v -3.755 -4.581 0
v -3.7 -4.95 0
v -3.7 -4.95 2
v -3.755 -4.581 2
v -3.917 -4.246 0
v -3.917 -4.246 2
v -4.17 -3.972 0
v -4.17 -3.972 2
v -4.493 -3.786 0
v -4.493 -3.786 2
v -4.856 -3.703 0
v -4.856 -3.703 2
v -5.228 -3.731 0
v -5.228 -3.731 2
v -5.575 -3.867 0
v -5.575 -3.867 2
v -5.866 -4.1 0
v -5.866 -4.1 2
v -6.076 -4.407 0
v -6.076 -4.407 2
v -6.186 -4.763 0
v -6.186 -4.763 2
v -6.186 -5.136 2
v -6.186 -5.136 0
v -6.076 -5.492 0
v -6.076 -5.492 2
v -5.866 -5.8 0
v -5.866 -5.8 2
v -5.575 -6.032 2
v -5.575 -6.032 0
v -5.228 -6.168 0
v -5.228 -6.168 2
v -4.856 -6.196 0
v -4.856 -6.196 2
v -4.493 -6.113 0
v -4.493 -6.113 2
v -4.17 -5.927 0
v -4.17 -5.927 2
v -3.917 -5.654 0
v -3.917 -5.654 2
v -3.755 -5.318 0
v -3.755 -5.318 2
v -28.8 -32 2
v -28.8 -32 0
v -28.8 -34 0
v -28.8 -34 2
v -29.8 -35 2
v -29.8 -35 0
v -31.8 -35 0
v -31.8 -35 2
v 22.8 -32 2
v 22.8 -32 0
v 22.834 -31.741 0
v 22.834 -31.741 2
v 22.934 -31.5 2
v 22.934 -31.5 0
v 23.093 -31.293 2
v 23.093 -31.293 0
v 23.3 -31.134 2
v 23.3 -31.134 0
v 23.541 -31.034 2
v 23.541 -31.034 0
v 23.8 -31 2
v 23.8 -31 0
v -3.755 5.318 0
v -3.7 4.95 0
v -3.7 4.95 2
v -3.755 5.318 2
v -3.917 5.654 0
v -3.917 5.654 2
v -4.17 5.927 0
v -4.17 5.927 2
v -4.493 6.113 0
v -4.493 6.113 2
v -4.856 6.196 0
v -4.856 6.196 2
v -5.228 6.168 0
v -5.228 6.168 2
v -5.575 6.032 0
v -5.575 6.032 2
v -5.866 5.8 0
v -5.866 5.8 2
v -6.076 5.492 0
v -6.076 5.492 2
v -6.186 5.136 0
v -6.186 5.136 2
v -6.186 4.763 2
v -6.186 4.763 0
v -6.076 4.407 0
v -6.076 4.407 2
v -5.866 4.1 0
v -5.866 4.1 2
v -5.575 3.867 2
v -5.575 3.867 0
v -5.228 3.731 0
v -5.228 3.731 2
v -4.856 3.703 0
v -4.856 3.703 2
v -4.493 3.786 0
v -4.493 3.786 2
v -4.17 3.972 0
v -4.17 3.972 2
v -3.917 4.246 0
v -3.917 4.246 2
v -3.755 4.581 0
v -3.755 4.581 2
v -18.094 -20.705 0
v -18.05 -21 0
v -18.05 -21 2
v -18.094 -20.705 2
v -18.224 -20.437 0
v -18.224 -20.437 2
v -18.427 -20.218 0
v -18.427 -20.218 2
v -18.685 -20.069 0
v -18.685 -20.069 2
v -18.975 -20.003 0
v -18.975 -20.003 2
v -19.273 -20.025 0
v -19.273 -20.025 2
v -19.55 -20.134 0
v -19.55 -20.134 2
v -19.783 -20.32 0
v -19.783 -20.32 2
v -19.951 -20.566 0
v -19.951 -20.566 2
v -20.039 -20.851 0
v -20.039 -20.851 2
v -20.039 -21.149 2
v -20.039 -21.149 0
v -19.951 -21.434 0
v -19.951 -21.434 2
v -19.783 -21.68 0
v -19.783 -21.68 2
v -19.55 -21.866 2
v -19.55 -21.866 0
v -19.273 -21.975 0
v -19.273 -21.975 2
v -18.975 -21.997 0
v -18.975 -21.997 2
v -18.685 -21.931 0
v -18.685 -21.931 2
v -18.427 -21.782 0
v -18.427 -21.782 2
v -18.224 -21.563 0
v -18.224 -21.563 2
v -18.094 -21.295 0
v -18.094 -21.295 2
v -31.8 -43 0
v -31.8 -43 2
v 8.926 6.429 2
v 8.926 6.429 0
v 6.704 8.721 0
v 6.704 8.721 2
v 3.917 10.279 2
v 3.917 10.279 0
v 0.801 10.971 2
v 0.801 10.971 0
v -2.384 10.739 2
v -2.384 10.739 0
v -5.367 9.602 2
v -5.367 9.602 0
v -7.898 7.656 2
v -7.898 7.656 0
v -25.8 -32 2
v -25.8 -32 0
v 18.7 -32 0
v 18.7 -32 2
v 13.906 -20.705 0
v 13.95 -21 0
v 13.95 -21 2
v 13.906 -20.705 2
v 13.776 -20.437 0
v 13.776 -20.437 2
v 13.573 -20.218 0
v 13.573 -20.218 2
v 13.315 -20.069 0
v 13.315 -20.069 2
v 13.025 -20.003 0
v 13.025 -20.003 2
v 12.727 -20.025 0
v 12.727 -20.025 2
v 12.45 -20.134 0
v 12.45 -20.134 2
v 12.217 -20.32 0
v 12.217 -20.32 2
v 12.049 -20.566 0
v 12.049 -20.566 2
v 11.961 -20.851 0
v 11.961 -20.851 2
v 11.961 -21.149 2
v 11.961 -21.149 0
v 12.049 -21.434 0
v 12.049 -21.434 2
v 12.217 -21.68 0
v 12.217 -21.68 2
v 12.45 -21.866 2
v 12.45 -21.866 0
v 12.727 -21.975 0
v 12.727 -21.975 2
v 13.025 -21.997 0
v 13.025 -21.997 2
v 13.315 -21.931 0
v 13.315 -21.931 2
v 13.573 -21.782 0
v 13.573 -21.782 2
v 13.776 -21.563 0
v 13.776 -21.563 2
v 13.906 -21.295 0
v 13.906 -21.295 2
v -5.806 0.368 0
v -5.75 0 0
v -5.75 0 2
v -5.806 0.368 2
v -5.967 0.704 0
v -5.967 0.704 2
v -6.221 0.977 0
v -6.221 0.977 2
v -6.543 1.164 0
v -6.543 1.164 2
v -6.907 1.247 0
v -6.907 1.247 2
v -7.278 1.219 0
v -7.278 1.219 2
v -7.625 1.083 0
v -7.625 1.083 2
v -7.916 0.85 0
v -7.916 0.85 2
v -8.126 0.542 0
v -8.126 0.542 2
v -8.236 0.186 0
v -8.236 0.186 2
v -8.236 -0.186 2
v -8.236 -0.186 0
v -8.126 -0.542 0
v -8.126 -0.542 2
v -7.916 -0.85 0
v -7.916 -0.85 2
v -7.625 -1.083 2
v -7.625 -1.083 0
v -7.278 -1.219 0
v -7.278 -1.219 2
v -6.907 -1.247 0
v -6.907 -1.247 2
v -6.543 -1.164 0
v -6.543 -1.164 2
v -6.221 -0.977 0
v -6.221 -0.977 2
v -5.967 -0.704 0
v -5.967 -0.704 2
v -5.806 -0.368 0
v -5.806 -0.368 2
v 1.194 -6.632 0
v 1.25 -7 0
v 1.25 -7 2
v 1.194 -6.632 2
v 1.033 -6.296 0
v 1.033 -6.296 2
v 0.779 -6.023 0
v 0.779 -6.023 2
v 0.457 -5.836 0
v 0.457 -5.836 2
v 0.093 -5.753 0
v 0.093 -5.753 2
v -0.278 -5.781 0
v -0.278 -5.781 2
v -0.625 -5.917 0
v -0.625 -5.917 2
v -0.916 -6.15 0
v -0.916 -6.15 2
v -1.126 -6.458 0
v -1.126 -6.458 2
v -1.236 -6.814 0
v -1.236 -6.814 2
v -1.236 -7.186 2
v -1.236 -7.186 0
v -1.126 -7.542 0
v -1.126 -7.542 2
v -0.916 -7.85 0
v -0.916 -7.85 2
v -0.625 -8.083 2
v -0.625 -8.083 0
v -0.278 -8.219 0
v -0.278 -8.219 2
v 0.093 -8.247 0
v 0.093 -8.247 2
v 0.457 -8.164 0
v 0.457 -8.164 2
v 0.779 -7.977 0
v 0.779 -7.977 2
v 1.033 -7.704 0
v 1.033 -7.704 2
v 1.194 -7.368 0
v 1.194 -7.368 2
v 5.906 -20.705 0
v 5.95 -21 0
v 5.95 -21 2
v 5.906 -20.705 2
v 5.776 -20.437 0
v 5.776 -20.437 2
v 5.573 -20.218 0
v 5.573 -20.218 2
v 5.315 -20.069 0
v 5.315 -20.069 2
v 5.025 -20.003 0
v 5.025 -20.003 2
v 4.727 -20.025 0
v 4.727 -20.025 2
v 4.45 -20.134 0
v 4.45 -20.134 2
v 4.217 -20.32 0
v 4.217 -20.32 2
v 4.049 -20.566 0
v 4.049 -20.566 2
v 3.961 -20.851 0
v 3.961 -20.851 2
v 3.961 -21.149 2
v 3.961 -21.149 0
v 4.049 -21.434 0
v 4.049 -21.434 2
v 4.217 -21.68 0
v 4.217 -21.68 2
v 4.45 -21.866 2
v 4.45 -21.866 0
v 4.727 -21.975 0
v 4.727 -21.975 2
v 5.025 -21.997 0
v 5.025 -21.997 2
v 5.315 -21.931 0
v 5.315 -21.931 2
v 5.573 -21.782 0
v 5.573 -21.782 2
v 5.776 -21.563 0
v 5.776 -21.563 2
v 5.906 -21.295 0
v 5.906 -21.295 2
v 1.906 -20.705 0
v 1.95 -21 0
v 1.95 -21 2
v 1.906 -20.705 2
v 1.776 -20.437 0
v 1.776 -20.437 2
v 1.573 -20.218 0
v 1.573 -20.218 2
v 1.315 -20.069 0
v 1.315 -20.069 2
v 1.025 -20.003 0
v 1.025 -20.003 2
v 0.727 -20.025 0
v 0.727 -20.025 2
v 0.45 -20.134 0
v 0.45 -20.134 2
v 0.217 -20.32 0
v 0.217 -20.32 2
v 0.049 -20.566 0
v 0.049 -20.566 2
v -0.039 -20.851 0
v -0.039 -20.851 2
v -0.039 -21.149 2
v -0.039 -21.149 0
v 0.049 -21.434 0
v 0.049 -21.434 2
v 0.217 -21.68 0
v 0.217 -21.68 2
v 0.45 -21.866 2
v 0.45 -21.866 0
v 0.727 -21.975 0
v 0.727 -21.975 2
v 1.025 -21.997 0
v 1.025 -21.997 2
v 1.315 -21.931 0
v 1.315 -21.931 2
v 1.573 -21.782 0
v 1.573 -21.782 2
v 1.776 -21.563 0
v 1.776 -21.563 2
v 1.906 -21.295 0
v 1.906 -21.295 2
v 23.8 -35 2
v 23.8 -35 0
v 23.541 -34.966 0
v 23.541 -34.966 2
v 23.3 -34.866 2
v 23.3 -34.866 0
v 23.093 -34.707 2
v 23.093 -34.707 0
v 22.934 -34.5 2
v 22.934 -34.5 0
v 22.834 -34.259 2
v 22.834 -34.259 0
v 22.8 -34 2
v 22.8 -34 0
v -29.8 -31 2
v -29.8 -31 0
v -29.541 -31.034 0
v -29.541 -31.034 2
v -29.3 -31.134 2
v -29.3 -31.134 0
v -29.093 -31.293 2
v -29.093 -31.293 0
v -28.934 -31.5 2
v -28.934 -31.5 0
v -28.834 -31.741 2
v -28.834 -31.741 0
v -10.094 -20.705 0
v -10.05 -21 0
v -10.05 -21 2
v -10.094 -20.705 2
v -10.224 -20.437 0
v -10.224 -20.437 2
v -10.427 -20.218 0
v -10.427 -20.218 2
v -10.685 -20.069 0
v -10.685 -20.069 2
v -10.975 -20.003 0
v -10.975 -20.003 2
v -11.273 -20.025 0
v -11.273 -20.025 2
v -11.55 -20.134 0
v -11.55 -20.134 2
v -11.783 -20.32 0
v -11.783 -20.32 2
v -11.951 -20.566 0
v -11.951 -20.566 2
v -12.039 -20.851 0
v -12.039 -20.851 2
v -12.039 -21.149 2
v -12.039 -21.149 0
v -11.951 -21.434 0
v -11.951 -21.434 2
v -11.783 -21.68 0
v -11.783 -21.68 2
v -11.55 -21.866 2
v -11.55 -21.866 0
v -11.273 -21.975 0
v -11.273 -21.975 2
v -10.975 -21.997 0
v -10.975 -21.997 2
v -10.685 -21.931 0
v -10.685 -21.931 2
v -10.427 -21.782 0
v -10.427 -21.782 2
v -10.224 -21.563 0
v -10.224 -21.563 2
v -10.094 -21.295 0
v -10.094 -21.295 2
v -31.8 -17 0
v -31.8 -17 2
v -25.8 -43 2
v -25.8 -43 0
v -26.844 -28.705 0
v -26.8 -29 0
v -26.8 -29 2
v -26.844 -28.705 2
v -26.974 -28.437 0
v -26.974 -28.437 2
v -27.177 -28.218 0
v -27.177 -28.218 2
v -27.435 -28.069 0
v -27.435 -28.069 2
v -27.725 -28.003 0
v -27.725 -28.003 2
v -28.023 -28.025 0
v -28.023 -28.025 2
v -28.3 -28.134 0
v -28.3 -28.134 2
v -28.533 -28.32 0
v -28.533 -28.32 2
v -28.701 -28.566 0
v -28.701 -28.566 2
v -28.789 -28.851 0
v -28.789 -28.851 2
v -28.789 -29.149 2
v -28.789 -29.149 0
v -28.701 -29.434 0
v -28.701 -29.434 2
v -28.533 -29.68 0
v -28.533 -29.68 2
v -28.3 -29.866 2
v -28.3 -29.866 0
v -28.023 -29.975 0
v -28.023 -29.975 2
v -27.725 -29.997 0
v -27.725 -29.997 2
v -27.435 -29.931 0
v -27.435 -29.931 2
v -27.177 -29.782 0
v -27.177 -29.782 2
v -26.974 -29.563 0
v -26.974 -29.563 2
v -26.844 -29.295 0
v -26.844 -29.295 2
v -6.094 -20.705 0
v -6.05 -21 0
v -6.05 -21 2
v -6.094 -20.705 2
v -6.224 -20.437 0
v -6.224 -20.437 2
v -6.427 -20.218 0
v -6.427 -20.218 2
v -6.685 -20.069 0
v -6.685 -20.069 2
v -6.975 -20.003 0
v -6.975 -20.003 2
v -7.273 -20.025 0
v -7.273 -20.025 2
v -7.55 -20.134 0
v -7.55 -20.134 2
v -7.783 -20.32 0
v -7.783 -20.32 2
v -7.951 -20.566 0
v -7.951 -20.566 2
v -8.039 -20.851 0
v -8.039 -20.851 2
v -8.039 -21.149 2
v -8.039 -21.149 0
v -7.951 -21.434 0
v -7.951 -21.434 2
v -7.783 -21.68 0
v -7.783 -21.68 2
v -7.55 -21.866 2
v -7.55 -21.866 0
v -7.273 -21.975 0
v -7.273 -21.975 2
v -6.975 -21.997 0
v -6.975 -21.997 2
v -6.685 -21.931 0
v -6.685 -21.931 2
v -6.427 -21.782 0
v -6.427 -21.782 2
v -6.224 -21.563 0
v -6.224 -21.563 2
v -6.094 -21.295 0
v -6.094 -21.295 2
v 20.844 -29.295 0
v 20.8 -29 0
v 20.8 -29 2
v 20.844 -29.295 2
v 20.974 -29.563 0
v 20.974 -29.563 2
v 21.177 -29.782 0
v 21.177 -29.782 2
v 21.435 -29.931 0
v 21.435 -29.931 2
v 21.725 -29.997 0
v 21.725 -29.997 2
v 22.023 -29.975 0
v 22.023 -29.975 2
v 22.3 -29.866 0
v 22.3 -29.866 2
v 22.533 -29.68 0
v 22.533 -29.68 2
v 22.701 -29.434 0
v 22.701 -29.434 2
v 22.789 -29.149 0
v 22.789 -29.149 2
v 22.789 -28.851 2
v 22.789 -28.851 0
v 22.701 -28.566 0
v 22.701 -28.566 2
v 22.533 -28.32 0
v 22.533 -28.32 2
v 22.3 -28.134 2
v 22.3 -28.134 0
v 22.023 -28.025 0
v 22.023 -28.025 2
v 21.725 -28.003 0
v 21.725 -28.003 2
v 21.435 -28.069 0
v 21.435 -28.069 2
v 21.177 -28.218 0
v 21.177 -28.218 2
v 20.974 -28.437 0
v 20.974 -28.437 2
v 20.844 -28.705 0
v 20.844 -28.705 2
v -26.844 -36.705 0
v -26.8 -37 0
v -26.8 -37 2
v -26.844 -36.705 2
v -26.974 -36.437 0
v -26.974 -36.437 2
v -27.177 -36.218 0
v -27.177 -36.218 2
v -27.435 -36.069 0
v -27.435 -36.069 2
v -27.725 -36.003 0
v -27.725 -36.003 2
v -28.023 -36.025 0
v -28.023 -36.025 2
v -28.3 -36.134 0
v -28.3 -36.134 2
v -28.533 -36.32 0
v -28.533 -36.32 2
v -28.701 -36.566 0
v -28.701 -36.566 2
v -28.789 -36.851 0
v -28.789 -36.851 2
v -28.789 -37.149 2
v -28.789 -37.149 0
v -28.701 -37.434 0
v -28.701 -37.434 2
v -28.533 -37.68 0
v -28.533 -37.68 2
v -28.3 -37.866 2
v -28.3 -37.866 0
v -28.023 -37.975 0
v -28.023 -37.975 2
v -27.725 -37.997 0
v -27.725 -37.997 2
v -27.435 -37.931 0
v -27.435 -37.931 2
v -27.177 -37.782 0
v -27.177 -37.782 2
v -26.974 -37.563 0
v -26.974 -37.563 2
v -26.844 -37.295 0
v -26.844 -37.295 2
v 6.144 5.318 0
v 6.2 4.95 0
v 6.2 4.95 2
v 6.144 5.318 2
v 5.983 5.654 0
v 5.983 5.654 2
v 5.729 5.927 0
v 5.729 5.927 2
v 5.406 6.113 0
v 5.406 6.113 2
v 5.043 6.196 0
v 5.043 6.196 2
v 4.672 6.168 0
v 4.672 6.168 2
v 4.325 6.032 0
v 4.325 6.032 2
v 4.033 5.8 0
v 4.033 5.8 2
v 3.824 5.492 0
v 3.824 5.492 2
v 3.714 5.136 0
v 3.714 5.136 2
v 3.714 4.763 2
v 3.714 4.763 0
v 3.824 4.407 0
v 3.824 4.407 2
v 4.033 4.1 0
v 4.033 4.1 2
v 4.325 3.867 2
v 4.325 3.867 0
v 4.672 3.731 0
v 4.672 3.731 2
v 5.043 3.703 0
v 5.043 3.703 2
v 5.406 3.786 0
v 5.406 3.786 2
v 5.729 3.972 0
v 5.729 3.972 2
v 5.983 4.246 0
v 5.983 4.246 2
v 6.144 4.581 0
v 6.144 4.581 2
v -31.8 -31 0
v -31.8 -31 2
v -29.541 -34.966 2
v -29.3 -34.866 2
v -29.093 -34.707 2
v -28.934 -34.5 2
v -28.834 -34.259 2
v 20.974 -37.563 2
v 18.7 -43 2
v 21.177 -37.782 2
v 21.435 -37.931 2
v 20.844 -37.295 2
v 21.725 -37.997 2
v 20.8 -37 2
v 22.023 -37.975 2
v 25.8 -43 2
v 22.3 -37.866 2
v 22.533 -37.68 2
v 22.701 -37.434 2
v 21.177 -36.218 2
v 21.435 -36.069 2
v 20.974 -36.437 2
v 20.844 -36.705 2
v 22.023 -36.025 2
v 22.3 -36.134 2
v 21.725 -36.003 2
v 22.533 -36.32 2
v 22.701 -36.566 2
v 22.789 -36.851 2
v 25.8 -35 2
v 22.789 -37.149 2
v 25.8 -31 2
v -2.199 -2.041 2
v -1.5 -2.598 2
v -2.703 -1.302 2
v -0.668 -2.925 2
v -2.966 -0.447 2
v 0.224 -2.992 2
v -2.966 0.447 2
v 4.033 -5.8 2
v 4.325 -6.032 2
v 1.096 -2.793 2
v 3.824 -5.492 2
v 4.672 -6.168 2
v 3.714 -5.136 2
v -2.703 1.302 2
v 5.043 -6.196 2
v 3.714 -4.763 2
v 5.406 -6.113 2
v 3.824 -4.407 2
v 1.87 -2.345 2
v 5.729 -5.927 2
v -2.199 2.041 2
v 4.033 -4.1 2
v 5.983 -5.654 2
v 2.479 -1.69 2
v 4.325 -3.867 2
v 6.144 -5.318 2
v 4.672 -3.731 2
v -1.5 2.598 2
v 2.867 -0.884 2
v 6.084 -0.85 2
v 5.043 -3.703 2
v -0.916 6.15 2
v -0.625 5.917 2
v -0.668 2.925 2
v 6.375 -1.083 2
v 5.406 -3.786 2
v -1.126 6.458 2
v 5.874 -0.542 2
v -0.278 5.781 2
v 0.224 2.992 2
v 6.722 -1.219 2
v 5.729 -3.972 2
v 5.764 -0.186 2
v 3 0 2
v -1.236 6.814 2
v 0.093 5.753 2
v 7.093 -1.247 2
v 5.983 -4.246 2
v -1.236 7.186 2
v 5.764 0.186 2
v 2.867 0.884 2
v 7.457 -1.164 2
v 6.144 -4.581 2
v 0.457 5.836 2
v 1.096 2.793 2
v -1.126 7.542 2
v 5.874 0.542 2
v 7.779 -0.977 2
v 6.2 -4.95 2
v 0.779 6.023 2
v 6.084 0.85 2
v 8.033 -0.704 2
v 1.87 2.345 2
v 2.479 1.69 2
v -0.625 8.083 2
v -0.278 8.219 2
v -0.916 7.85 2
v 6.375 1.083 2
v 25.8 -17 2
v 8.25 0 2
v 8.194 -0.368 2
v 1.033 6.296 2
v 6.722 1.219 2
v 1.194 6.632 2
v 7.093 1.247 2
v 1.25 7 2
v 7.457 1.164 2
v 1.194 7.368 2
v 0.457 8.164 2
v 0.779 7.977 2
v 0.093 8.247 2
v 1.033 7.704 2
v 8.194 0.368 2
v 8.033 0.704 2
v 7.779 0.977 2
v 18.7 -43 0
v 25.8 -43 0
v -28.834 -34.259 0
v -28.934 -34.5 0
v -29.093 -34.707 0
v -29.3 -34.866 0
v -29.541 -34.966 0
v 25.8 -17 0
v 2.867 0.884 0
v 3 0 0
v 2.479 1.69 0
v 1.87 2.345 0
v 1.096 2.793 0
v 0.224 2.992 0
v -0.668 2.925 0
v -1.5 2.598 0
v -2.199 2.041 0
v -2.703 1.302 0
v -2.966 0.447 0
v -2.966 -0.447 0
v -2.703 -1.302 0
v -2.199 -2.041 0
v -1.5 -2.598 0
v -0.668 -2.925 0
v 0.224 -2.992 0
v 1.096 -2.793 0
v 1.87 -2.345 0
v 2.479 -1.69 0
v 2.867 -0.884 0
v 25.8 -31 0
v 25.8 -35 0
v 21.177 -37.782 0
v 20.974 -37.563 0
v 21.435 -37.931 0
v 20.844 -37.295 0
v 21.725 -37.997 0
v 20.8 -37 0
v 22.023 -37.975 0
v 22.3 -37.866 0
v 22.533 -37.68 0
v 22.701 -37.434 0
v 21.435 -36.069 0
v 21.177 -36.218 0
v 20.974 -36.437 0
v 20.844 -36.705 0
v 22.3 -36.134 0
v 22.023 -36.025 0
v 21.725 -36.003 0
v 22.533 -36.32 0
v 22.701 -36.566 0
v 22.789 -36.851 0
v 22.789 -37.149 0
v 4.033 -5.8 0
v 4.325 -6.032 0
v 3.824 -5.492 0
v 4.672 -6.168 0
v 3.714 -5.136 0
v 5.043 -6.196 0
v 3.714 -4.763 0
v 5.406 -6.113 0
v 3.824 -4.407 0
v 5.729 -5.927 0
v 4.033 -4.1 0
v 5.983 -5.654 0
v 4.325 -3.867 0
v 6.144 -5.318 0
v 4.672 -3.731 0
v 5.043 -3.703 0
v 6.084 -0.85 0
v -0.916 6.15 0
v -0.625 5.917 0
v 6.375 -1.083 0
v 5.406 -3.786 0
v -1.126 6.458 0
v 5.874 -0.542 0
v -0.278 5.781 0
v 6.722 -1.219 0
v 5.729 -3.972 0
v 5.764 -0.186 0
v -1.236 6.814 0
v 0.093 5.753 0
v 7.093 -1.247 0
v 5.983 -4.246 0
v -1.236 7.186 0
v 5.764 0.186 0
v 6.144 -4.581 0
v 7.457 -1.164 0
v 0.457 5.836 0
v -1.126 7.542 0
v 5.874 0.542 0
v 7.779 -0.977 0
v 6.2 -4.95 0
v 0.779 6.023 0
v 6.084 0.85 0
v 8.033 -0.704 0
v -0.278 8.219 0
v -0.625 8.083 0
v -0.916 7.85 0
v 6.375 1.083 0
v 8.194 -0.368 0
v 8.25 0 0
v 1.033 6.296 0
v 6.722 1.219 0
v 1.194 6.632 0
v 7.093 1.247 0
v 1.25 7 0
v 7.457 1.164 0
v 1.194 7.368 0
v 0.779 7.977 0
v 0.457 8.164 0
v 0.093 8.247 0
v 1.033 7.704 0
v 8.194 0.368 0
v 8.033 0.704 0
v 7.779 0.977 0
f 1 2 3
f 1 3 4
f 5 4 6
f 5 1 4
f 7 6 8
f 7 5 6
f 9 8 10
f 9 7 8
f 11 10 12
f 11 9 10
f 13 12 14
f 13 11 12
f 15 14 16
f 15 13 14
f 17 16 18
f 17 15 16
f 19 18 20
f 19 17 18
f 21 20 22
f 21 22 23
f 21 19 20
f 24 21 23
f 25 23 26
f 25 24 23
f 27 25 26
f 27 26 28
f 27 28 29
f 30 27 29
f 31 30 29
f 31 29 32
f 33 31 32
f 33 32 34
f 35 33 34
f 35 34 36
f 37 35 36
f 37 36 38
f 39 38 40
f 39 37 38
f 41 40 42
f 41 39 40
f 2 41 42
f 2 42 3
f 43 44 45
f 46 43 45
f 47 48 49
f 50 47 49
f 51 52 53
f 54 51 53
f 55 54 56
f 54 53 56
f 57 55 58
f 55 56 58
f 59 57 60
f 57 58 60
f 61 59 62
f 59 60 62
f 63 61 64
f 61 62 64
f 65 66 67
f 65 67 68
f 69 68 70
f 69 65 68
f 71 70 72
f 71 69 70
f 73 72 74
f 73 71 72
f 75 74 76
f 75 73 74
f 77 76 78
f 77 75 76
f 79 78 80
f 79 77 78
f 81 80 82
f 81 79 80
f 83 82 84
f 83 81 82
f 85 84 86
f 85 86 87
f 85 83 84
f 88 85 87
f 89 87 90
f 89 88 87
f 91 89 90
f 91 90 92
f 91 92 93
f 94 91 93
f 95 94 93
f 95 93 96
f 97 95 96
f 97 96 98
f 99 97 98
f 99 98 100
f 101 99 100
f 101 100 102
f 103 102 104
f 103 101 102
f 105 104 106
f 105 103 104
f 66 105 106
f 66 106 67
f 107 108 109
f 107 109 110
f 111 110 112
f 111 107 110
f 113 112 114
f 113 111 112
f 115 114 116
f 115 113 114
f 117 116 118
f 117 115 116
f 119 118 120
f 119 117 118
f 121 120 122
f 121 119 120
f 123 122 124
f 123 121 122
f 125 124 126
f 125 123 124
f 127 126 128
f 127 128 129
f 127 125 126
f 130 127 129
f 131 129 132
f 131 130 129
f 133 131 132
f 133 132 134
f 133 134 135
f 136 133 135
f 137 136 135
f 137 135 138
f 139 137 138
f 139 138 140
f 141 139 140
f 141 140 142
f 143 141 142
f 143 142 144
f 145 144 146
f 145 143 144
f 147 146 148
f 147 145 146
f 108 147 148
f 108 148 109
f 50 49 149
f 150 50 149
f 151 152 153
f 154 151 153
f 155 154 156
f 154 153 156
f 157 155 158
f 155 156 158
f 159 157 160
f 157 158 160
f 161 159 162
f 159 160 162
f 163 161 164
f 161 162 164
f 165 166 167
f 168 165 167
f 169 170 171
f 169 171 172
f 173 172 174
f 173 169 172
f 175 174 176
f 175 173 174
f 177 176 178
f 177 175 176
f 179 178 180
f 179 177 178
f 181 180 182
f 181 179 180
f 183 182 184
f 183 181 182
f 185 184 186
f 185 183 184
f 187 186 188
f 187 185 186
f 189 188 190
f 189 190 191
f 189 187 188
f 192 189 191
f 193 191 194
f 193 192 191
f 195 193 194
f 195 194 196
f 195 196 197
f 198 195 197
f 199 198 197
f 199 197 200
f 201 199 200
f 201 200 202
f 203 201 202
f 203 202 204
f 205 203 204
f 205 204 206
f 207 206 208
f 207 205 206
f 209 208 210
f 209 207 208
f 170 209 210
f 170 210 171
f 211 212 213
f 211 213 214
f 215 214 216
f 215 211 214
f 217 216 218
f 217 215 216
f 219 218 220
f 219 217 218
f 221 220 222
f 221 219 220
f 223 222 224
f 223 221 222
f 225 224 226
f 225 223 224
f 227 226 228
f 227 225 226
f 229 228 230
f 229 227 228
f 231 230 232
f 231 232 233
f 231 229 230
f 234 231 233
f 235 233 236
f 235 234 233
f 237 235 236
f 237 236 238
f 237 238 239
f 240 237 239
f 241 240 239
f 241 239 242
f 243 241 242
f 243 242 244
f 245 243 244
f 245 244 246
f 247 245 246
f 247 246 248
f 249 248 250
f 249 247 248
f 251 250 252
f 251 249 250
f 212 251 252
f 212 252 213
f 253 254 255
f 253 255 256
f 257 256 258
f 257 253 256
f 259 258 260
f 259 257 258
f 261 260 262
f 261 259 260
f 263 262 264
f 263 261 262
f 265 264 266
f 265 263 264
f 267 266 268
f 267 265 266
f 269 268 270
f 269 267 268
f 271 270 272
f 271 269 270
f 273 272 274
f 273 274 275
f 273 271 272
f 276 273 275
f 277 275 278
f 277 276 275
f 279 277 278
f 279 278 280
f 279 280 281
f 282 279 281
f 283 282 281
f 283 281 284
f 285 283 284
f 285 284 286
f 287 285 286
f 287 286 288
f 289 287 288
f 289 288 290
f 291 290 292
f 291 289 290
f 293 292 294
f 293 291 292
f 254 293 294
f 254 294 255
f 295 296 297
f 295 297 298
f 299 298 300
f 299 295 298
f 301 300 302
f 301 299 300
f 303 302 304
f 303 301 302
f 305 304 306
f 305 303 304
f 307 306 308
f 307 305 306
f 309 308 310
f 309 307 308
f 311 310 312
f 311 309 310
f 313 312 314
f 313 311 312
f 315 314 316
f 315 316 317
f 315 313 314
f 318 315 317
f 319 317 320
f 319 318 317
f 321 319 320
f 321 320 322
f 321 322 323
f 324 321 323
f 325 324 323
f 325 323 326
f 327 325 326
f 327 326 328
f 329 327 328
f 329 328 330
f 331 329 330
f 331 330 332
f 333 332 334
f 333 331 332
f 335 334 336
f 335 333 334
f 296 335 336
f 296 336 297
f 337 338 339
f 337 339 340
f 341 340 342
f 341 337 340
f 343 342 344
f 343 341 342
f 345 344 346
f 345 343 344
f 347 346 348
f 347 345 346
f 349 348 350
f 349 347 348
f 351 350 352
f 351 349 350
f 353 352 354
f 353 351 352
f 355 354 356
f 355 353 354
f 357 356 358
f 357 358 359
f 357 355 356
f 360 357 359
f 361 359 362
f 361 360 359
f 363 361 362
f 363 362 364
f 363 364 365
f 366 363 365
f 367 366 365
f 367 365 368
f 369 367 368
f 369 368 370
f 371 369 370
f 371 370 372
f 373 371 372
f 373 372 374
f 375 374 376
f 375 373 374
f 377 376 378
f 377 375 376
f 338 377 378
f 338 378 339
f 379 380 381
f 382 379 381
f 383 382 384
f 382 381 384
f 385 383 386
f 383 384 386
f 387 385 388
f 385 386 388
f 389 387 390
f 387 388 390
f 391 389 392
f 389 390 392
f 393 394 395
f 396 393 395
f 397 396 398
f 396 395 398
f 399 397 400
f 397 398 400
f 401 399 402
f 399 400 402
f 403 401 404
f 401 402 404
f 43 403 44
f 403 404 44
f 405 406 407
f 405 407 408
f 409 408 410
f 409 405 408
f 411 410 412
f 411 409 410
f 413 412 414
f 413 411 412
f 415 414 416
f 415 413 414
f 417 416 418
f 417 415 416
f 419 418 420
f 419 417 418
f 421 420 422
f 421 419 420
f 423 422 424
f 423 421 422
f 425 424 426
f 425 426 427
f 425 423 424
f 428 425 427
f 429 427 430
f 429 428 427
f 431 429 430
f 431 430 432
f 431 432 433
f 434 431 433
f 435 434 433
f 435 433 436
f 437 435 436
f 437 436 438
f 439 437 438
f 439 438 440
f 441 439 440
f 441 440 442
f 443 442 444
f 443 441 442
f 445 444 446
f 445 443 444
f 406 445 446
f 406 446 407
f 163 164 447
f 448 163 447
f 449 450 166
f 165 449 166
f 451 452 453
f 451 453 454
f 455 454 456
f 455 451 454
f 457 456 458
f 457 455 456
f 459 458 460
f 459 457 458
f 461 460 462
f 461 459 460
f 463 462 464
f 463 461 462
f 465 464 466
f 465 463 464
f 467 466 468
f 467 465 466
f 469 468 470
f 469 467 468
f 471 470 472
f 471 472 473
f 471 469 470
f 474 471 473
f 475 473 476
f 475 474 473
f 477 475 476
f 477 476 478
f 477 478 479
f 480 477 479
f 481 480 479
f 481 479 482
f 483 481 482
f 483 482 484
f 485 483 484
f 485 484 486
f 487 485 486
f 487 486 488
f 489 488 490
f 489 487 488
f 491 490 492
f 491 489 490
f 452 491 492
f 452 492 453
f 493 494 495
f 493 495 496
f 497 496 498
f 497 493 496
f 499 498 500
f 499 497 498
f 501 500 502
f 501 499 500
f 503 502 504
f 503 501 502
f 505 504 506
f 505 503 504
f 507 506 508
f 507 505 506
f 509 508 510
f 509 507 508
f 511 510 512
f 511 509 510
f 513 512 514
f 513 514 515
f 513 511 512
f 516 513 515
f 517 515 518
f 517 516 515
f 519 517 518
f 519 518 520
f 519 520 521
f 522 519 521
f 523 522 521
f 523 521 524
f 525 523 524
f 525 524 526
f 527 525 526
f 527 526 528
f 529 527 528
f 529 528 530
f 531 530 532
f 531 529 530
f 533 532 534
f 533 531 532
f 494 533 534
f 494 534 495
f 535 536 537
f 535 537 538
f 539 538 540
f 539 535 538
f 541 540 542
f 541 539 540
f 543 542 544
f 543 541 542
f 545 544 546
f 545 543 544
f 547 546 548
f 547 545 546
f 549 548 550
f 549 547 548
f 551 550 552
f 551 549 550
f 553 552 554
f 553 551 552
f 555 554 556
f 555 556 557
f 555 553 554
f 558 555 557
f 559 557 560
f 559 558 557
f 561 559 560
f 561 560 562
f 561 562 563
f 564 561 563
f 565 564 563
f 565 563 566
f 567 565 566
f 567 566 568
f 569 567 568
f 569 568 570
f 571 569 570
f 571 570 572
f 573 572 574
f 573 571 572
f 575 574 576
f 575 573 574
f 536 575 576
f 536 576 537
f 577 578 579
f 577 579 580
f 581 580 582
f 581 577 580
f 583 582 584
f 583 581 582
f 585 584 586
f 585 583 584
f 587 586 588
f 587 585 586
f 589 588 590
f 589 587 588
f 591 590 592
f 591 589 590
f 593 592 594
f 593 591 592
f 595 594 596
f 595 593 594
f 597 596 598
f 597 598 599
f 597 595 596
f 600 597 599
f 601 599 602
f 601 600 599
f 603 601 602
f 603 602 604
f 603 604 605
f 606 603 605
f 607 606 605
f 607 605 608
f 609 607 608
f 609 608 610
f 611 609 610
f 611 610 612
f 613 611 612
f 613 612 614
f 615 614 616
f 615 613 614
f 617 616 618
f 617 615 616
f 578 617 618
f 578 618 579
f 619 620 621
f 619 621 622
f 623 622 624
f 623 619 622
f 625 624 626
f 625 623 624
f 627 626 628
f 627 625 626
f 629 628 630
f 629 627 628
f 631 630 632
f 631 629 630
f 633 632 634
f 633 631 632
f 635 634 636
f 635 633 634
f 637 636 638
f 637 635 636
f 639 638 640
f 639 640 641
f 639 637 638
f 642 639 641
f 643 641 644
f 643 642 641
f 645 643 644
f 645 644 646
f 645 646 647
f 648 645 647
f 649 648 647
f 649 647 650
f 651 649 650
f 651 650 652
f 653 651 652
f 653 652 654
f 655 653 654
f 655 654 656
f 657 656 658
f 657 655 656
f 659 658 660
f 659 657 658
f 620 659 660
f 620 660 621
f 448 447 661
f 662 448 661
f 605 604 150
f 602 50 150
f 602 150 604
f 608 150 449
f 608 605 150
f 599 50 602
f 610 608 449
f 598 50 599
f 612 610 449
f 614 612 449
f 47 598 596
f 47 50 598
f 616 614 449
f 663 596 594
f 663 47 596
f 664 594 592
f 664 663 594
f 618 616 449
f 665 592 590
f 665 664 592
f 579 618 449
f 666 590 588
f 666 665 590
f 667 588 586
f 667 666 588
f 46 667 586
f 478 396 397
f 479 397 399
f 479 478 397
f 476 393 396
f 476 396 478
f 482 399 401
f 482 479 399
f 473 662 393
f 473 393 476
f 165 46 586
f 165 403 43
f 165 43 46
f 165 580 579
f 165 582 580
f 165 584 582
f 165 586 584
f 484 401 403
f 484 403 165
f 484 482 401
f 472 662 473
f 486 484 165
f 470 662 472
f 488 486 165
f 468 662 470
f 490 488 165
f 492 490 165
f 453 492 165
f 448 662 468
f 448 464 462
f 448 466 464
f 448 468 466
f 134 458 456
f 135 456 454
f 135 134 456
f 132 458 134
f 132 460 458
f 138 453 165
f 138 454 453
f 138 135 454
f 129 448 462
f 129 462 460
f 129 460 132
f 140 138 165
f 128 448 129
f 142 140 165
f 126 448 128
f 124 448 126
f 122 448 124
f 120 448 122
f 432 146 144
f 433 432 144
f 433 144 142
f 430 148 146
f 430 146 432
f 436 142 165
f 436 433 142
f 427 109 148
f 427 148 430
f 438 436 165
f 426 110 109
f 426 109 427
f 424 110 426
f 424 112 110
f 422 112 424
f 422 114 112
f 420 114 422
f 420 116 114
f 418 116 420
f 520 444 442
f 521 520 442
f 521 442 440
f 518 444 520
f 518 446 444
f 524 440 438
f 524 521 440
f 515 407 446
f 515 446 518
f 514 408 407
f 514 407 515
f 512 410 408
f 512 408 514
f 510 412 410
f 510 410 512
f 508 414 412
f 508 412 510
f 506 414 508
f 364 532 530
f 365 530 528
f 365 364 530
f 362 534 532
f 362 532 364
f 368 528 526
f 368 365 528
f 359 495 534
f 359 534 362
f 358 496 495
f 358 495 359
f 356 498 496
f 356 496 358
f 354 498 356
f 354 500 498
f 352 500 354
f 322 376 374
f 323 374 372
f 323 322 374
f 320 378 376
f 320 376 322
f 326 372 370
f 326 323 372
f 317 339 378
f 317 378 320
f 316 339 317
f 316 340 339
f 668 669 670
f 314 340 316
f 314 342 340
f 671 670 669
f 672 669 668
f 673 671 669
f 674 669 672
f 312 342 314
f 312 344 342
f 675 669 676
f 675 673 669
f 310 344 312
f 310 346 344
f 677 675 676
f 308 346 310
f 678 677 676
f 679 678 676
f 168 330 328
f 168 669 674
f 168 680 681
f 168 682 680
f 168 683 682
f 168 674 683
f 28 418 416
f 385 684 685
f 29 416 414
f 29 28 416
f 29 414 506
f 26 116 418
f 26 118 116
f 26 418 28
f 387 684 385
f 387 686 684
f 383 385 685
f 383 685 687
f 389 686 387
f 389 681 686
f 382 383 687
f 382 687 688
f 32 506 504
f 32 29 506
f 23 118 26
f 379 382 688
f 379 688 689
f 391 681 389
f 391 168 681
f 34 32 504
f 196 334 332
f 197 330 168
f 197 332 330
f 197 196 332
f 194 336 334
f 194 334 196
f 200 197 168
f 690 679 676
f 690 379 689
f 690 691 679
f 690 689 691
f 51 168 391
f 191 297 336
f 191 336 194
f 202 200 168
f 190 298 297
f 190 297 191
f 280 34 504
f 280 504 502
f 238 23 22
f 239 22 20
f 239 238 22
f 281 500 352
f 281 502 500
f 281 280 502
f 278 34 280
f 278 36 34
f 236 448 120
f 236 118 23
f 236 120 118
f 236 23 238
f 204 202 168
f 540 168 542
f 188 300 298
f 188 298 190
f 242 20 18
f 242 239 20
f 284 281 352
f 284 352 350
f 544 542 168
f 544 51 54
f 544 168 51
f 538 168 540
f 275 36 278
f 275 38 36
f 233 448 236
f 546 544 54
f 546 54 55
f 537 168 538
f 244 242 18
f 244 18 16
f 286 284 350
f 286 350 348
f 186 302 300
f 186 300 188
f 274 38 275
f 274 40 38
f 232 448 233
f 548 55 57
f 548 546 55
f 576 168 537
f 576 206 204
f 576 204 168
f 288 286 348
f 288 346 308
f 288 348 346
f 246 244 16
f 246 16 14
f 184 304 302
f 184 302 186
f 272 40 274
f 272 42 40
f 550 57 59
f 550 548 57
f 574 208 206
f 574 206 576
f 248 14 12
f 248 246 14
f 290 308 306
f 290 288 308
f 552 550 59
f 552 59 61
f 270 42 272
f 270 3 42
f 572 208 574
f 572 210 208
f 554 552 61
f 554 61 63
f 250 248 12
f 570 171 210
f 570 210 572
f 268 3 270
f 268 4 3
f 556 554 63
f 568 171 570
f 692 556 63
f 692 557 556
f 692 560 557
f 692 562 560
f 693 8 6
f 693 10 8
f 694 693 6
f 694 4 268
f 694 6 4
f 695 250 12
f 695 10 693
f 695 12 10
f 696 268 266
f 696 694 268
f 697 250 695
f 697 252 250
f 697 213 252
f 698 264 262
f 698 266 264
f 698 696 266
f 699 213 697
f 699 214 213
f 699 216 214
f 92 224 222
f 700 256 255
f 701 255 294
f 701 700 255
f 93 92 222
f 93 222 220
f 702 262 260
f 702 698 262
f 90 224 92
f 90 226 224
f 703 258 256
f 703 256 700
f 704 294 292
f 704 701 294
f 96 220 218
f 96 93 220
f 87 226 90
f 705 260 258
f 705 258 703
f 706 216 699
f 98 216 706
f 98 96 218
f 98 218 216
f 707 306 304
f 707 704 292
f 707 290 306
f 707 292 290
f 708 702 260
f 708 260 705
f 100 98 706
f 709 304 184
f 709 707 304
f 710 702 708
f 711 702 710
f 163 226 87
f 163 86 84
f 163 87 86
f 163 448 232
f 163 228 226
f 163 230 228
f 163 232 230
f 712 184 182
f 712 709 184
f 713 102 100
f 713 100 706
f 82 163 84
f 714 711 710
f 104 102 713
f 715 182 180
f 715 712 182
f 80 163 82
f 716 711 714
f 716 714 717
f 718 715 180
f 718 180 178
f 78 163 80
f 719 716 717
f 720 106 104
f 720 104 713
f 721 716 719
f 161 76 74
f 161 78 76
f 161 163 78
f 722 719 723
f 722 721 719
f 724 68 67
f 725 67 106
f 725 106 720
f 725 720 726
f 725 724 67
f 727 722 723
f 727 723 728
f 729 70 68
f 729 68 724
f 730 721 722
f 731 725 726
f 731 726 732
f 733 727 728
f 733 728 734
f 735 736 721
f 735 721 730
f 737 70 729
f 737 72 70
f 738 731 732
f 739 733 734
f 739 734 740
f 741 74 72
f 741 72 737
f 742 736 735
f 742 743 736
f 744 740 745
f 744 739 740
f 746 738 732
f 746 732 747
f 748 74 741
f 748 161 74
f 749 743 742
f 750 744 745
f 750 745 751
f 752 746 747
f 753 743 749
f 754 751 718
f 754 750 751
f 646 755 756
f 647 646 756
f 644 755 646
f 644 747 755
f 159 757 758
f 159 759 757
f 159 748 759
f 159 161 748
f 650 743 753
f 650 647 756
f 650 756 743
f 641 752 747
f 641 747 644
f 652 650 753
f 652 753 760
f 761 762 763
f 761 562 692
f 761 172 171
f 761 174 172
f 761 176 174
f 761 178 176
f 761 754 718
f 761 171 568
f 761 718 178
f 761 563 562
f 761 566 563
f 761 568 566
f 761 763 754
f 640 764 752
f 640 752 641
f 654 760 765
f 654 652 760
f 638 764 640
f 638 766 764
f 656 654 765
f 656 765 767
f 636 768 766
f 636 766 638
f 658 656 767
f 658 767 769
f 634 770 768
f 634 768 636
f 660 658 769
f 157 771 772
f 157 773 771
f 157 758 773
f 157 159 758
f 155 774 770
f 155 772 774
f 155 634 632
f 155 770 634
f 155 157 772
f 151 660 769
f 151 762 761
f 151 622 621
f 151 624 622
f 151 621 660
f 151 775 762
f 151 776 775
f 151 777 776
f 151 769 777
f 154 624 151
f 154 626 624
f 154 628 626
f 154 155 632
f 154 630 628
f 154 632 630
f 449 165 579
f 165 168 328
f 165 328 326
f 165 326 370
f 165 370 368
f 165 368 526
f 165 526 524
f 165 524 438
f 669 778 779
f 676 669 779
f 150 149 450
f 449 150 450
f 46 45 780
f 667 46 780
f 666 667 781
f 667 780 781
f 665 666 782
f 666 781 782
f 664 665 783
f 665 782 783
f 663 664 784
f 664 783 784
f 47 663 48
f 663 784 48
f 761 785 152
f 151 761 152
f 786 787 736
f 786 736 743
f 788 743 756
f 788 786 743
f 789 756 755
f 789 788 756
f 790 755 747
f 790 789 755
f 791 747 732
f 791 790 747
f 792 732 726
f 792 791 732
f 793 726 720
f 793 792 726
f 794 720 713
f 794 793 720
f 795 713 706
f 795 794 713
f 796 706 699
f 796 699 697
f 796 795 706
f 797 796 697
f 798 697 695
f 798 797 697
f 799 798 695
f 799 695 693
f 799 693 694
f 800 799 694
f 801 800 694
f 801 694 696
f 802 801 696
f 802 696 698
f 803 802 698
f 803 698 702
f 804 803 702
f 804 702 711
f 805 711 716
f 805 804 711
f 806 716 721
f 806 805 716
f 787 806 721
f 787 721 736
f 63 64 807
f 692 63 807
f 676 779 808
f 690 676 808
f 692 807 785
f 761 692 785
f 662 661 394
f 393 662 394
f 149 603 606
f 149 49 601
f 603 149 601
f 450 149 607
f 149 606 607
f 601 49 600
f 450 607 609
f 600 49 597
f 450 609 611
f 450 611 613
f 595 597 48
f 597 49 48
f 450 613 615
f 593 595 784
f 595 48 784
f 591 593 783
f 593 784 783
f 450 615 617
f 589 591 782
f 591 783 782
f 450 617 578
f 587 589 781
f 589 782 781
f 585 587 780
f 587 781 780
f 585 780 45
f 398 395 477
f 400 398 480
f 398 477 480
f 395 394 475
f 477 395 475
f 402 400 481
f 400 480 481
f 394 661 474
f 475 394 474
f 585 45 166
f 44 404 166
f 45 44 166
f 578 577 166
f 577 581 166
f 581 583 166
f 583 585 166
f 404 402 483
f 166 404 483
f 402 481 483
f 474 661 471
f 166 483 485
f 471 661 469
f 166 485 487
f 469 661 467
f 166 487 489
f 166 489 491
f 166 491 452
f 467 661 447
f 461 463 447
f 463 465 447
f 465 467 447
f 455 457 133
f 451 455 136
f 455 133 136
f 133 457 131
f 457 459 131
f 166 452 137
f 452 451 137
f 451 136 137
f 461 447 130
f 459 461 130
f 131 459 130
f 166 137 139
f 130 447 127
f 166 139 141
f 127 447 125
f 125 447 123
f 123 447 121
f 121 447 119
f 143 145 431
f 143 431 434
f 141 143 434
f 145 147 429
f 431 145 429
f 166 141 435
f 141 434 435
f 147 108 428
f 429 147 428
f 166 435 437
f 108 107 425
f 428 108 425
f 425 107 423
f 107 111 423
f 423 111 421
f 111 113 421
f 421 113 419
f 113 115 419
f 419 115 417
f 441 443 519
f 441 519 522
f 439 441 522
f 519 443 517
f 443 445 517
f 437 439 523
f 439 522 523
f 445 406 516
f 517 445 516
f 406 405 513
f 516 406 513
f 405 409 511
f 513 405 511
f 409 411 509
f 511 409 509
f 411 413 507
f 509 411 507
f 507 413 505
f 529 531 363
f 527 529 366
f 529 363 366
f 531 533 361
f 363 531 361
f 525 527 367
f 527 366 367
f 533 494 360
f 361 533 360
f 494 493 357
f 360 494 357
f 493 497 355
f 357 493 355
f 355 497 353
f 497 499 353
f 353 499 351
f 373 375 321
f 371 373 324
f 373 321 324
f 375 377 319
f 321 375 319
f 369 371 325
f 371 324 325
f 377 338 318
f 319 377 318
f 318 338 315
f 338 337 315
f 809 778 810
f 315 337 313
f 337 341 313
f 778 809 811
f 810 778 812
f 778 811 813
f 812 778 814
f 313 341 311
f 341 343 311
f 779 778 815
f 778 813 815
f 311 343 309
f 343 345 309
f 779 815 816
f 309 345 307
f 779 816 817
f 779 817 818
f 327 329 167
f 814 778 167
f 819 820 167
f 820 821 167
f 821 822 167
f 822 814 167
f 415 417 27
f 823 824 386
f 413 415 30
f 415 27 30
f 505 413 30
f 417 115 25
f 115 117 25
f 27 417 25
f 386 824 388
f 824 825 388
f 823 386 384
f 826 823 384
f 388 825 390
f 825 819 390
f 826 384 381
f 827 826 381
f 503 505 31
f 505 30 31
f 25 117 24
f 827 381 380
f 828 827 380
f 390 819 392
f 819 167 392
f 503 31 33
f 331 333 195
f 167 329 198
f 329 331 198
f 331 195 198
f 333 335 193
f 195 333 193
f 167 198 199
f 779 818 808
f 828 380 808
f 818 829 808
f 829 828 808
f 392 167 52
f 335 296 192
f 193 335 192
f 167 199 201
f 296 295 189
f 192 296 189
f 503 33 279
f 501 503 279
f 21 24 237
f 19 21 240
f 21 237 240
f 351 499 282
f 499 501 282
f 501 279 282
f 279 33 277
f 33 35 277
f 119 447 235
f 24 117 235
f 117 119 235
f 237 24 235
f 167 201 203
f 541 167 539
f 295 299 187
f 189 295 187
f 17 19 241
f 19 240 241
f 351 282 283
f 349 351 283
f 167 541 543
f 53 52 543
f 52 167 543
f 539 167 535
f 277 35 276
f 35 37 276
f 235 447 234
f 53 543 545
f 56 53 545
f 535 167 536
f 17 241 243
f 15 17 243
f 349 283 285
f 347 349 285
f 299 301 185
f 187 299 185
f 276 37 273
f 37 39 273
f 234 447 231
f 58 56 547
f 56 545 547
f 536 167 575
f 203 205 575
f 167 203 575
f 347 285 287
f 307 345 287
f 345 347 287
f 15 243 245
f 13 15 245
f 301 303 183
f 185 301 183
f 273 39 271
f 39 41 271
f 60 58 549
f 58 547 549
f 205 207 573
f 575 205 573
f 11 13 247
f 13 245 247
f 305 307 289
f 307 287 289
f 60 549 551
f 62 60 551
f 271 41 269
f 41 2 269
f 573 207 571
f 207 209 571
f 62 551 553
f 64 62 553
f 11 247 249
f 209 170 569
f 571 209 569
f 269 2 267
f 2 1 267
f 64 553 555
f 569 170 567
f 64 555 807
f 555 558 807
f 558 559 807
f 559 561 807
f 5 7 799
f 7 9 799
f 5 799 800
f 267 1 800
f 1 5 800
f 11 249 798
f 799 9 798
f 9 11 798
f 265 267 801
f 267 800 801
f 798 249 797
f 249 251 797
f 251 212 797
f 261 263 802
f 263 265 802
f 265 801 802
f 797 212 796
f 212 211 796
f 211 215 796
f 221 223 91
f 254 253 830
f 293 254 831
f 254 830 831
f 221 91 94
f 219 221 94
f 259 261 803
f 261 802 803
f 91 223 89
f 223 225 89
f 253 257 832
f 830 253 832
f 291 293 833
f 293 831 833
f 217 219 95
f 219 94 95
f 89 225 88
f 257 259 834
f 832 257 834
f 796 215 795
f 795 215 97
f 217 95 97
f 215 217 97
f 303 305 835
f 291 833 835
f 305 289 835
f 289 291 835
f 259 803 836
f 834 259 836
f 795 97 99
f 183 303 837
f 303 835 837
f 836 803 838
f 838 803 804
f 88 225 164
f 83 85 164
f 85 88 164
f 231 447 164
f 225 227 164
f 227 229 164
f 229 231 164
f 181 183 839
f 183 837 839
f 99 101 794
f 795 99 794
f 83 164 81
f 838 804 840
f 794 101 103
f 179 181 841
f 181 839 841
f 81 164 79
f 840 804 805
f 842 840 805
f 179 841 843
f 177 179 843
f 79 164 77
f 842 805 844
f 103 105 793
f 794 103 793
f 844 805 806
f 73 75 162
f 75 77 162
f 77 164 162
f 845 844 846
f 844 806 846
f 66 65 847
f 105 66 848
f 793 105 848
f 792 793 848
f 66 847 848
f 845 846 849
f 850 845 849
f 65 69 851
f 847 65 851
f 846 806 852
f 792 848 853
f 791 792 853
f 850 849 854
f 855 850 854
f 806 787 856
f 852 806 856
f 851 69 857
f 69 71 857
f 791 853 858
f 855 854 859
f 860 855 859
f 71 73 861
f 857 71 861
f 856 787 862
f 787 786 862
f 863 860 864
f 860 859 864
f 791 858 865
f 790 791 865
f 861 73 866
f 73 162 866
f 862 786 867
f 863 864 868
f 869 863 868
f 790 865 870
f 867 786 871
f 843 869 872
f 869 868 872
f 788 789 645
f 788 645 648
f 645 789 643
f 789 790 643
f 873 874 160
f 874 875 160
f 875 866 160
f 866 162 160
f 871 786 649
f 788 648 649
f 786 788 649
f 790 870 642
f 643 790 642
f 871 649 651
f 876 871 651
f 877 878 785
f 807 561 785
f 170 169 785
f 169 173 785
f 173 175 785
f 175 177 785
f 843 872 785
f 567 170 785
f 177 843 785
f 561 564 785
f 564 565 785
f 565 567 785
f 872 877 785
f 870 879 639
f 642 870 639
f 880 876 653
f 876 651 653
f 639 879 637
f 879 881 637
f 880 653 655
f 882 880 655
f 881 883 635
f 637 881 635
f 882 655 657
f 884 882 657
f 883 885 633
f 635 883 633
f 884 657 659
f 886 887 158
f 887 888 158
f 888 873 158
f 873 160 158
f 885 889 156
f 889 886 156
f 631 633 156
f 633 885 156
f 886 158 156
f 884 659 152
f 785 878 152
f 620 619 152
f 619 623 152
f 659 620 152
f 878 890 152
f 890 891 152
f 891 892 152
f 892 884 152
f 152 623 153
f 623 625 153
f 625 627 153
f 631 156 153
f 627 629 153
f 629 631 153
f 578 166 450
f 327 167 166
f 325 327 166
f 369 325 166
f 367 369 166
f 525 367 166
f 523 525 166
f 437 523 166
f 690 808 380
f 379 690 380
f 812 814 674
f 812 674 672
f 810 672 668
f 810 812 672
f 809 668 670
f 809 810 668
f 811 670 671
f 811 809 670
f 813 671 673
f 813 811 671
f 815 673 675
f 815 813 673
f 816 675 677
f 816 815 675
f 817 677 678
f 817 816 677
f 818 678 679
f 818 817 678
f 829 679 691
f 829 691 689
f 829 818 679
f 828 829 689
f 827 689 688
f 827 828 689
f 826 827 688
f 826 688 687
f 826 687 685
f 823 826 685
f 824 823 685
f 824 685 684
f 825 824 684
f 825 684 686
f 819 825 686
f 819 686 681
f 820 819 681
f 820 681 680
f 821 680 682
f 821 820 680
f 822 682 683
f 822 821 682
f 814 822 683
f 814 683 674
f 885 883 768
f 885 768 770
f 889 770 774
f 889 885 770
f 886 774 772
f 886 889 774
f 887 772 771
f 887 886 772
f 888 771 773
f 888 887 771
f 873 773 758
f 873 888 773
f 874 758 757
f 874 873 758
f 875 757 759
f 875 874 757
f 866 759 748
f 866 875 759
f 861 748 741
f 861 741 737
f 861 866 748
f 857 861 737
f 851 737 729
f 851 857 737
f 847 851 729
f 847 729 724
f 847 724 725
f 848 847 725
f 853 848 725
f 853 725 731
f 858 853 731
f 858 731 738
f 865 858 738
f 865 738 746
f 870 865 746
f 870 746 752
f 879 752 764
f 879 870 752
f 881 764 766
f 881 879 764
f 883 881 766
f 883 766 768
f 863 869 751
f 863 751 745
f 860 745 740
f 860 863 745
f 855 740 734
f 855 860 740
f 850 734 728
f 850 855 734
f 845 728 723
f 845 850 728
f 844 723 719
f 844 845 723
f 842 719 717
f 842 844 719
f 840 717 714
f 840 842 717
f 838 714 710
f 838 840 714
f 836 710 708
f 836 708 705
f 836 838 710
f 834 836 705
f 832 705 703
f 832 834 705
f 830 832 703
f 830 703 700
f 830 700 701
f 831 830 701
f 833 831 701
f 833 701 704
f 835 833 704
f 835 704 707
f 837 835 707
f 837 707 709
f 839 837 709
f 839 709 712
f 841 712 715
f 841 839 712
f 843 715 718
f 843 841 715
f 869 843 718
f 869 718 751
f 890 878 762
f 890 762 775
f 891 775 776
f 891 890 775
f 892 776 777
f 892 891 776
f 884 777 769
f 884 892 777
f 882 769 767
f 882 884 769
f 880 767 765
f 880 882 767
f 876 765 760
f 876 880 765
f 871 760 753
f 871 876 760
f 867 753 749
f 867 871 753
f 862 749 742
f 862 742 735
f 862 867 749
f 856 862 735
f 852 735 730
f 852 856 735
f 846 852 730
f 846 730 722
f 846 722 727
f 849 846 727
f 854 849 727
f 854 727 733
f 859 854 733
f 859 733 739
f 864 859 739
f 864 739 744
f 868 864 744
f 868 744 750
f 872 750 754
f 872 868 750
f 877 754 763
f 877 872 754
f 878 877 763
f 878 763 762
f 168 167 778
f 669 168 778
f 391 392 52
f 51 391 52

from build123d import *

# Parameters (mm, degrees)
SKETCH_1_R      = 3
SKETCH_1_R_2    = 1.25
SKETCH_1_R_3    = 1
EXTRUDE_1_DEPTH = 2


with BuildPart() as part:
    # 草圖1 → 填料-伸長1 (new body)
    with BuildSketch(Plane.XY):
        with BuildLine():
            Line((25.8, -18), (25.8, -17))
            Line((25.8, -17), (8.925896882, 6.428714091))
            ThreePointArc((8.925896882, 6.428714091), (0.800566406, 10.970829204), (-7.898074186, 7.656397596))
            Line((-7.898074186, 7.656397596), (-31.8, -17))
            Line((-31.8, -17), (-31.8, -18))
            Line((-31.8, -18), (-31.8, -31))
            Line((-31.8, -31), (-29.8, -31))
            ThreePointArc((-29.8, -31), (-29.092893219, -31.292893219), (-28.8, -32))
            Line((-28.8, -32), (-28.8, -34))
            ThreePointArc((-28.8, -34), (-29.092893219, -34.707106781), (-29.8, -35))
            Line((-29.8, -35), (-31.8, -35))
            Line((-31.8, -35), (-31.8, -36))
            Line((-31.8, -36), (-31.8, -42))
            Line((-31.8, -42), (-31.8, -43))
            Line((-31.8, -43), (-30.8, -43))
            Line((-30.8, -43), (-26.8, -43))
            Line((-26.8, -43), (-25.8, -43))
            Line((-25.8, -43), (-25.8, -32))
            Line((-25.8, -32), (18.7, -32))
            Line((18.7, -32), (18.7, -43))
            Line((18.7, -43), (19.7, -43))
            Line((19.7, -43), (20.7, -43))
            Line((20.7, -43), (24.8, -43))
            Line((24.8, -43), (25.8, -43))
            Line((25.8, -43), (25.8, -42))
            Line((25.8, -42), (25.8, -36))
            Line((25.8, -36), (25.8, -35))
            Line((25.8, -35), (23.8, -35))
            ThreePointArc((23.8, -35), (23.092893219, -34.707106781), (22.8, -34))
            Line((22.8, -34), (22.8, -32))
            ThreePointArc((22.8, -32), (23.092893219, -31.292893219), (23.8, -31))
            Line((23.8, -31), (25.8, -31))
            Line((25.8, -31), (25.8, -18))
        make_face()
        Circle(SKETCH_1_R, mode=Mode.SUBTRACT)
        with Locations((0, 7)):
            Circle(SKETCH_1_R_2, mode=Mode.SUBTRACT)
        with Locations((4.949747468, 4.949747468)):
            Circle(SKETCH_1_R_2, mode=Mode.SUBTRACT)
        with Locations((7, 0)):
            Circle(SKETCH_1_R_2, mode=Mode.SUBTRACT)
        with Locations((4.949747468, -4.949747468)):
            Circle(SKETCH_1_R_2, mode=Mode.SUBTRACT)
        with Locations((0, -7)):
            Circle(SKETCH_1_R_2, mode=Mode.SUBTRACT)
        with Locations((-4.949747468, -4.949747468)):
            Circle(SKETCH_1_R_2, mode=Mode.SUBTRACT)
        with Locations((-7, 0)):
            Circle(SKETCH_1_R_2, mode=Mode.SUBTRACT)
        with Locations((-4.949747468, 4.949747468)):
            Circle(SKETCH_1_R_2, mode=Mode.SUBTRACT)
        with Locations((-27.8, -29)):
            Circle(SKETCH_1_R_3, mode=Mode.SUBTRACT)
        with Locations((-27.8, -37)):
            Circle(SKETCH_1_R_3, mode=Mode.SUBTRACT)
        with Locations(Location((21.8, -37, 0), (0, 0, 180))):
            Circle(SKETCH_1_R_3, mode=Mode.SUBTRACT)
        with Locations(Location((21.8, -29, 0), (0, 0, 180))):
            Circle(SKETCH_1_R_3, mode=Mode.SUBTRACT)
        with Locations((-19.05, -21)):
            Circle(SKETCH_1_R_3, mode=Mode.SUBTRACT)
        with Locations((-11.05, -21)):
            Circle(SKETCH_1_R_3, mode=Mode.SUBTRACT)
        with Locations((4.95, -21)):
            Circle(SKETCH_1_R_3, mode=Mode.SUBTRACT)
        with Locations((12.95, -21)):
            Circle(SKETCH_1_R_3, mode=Mode.SUBTRACT)
        with Locations((-7.05, -21)):
            Circle(SKETCH_1_R_3, mode=Mode.SUBTRACT)
        with Locations((0.95, -21)):
            Circle(SKETCH_1_R_3, mode=Mode.SUBTRACT)
    extrude(amount=EXTRUDE_1_DEPTH)


solid = part.part
